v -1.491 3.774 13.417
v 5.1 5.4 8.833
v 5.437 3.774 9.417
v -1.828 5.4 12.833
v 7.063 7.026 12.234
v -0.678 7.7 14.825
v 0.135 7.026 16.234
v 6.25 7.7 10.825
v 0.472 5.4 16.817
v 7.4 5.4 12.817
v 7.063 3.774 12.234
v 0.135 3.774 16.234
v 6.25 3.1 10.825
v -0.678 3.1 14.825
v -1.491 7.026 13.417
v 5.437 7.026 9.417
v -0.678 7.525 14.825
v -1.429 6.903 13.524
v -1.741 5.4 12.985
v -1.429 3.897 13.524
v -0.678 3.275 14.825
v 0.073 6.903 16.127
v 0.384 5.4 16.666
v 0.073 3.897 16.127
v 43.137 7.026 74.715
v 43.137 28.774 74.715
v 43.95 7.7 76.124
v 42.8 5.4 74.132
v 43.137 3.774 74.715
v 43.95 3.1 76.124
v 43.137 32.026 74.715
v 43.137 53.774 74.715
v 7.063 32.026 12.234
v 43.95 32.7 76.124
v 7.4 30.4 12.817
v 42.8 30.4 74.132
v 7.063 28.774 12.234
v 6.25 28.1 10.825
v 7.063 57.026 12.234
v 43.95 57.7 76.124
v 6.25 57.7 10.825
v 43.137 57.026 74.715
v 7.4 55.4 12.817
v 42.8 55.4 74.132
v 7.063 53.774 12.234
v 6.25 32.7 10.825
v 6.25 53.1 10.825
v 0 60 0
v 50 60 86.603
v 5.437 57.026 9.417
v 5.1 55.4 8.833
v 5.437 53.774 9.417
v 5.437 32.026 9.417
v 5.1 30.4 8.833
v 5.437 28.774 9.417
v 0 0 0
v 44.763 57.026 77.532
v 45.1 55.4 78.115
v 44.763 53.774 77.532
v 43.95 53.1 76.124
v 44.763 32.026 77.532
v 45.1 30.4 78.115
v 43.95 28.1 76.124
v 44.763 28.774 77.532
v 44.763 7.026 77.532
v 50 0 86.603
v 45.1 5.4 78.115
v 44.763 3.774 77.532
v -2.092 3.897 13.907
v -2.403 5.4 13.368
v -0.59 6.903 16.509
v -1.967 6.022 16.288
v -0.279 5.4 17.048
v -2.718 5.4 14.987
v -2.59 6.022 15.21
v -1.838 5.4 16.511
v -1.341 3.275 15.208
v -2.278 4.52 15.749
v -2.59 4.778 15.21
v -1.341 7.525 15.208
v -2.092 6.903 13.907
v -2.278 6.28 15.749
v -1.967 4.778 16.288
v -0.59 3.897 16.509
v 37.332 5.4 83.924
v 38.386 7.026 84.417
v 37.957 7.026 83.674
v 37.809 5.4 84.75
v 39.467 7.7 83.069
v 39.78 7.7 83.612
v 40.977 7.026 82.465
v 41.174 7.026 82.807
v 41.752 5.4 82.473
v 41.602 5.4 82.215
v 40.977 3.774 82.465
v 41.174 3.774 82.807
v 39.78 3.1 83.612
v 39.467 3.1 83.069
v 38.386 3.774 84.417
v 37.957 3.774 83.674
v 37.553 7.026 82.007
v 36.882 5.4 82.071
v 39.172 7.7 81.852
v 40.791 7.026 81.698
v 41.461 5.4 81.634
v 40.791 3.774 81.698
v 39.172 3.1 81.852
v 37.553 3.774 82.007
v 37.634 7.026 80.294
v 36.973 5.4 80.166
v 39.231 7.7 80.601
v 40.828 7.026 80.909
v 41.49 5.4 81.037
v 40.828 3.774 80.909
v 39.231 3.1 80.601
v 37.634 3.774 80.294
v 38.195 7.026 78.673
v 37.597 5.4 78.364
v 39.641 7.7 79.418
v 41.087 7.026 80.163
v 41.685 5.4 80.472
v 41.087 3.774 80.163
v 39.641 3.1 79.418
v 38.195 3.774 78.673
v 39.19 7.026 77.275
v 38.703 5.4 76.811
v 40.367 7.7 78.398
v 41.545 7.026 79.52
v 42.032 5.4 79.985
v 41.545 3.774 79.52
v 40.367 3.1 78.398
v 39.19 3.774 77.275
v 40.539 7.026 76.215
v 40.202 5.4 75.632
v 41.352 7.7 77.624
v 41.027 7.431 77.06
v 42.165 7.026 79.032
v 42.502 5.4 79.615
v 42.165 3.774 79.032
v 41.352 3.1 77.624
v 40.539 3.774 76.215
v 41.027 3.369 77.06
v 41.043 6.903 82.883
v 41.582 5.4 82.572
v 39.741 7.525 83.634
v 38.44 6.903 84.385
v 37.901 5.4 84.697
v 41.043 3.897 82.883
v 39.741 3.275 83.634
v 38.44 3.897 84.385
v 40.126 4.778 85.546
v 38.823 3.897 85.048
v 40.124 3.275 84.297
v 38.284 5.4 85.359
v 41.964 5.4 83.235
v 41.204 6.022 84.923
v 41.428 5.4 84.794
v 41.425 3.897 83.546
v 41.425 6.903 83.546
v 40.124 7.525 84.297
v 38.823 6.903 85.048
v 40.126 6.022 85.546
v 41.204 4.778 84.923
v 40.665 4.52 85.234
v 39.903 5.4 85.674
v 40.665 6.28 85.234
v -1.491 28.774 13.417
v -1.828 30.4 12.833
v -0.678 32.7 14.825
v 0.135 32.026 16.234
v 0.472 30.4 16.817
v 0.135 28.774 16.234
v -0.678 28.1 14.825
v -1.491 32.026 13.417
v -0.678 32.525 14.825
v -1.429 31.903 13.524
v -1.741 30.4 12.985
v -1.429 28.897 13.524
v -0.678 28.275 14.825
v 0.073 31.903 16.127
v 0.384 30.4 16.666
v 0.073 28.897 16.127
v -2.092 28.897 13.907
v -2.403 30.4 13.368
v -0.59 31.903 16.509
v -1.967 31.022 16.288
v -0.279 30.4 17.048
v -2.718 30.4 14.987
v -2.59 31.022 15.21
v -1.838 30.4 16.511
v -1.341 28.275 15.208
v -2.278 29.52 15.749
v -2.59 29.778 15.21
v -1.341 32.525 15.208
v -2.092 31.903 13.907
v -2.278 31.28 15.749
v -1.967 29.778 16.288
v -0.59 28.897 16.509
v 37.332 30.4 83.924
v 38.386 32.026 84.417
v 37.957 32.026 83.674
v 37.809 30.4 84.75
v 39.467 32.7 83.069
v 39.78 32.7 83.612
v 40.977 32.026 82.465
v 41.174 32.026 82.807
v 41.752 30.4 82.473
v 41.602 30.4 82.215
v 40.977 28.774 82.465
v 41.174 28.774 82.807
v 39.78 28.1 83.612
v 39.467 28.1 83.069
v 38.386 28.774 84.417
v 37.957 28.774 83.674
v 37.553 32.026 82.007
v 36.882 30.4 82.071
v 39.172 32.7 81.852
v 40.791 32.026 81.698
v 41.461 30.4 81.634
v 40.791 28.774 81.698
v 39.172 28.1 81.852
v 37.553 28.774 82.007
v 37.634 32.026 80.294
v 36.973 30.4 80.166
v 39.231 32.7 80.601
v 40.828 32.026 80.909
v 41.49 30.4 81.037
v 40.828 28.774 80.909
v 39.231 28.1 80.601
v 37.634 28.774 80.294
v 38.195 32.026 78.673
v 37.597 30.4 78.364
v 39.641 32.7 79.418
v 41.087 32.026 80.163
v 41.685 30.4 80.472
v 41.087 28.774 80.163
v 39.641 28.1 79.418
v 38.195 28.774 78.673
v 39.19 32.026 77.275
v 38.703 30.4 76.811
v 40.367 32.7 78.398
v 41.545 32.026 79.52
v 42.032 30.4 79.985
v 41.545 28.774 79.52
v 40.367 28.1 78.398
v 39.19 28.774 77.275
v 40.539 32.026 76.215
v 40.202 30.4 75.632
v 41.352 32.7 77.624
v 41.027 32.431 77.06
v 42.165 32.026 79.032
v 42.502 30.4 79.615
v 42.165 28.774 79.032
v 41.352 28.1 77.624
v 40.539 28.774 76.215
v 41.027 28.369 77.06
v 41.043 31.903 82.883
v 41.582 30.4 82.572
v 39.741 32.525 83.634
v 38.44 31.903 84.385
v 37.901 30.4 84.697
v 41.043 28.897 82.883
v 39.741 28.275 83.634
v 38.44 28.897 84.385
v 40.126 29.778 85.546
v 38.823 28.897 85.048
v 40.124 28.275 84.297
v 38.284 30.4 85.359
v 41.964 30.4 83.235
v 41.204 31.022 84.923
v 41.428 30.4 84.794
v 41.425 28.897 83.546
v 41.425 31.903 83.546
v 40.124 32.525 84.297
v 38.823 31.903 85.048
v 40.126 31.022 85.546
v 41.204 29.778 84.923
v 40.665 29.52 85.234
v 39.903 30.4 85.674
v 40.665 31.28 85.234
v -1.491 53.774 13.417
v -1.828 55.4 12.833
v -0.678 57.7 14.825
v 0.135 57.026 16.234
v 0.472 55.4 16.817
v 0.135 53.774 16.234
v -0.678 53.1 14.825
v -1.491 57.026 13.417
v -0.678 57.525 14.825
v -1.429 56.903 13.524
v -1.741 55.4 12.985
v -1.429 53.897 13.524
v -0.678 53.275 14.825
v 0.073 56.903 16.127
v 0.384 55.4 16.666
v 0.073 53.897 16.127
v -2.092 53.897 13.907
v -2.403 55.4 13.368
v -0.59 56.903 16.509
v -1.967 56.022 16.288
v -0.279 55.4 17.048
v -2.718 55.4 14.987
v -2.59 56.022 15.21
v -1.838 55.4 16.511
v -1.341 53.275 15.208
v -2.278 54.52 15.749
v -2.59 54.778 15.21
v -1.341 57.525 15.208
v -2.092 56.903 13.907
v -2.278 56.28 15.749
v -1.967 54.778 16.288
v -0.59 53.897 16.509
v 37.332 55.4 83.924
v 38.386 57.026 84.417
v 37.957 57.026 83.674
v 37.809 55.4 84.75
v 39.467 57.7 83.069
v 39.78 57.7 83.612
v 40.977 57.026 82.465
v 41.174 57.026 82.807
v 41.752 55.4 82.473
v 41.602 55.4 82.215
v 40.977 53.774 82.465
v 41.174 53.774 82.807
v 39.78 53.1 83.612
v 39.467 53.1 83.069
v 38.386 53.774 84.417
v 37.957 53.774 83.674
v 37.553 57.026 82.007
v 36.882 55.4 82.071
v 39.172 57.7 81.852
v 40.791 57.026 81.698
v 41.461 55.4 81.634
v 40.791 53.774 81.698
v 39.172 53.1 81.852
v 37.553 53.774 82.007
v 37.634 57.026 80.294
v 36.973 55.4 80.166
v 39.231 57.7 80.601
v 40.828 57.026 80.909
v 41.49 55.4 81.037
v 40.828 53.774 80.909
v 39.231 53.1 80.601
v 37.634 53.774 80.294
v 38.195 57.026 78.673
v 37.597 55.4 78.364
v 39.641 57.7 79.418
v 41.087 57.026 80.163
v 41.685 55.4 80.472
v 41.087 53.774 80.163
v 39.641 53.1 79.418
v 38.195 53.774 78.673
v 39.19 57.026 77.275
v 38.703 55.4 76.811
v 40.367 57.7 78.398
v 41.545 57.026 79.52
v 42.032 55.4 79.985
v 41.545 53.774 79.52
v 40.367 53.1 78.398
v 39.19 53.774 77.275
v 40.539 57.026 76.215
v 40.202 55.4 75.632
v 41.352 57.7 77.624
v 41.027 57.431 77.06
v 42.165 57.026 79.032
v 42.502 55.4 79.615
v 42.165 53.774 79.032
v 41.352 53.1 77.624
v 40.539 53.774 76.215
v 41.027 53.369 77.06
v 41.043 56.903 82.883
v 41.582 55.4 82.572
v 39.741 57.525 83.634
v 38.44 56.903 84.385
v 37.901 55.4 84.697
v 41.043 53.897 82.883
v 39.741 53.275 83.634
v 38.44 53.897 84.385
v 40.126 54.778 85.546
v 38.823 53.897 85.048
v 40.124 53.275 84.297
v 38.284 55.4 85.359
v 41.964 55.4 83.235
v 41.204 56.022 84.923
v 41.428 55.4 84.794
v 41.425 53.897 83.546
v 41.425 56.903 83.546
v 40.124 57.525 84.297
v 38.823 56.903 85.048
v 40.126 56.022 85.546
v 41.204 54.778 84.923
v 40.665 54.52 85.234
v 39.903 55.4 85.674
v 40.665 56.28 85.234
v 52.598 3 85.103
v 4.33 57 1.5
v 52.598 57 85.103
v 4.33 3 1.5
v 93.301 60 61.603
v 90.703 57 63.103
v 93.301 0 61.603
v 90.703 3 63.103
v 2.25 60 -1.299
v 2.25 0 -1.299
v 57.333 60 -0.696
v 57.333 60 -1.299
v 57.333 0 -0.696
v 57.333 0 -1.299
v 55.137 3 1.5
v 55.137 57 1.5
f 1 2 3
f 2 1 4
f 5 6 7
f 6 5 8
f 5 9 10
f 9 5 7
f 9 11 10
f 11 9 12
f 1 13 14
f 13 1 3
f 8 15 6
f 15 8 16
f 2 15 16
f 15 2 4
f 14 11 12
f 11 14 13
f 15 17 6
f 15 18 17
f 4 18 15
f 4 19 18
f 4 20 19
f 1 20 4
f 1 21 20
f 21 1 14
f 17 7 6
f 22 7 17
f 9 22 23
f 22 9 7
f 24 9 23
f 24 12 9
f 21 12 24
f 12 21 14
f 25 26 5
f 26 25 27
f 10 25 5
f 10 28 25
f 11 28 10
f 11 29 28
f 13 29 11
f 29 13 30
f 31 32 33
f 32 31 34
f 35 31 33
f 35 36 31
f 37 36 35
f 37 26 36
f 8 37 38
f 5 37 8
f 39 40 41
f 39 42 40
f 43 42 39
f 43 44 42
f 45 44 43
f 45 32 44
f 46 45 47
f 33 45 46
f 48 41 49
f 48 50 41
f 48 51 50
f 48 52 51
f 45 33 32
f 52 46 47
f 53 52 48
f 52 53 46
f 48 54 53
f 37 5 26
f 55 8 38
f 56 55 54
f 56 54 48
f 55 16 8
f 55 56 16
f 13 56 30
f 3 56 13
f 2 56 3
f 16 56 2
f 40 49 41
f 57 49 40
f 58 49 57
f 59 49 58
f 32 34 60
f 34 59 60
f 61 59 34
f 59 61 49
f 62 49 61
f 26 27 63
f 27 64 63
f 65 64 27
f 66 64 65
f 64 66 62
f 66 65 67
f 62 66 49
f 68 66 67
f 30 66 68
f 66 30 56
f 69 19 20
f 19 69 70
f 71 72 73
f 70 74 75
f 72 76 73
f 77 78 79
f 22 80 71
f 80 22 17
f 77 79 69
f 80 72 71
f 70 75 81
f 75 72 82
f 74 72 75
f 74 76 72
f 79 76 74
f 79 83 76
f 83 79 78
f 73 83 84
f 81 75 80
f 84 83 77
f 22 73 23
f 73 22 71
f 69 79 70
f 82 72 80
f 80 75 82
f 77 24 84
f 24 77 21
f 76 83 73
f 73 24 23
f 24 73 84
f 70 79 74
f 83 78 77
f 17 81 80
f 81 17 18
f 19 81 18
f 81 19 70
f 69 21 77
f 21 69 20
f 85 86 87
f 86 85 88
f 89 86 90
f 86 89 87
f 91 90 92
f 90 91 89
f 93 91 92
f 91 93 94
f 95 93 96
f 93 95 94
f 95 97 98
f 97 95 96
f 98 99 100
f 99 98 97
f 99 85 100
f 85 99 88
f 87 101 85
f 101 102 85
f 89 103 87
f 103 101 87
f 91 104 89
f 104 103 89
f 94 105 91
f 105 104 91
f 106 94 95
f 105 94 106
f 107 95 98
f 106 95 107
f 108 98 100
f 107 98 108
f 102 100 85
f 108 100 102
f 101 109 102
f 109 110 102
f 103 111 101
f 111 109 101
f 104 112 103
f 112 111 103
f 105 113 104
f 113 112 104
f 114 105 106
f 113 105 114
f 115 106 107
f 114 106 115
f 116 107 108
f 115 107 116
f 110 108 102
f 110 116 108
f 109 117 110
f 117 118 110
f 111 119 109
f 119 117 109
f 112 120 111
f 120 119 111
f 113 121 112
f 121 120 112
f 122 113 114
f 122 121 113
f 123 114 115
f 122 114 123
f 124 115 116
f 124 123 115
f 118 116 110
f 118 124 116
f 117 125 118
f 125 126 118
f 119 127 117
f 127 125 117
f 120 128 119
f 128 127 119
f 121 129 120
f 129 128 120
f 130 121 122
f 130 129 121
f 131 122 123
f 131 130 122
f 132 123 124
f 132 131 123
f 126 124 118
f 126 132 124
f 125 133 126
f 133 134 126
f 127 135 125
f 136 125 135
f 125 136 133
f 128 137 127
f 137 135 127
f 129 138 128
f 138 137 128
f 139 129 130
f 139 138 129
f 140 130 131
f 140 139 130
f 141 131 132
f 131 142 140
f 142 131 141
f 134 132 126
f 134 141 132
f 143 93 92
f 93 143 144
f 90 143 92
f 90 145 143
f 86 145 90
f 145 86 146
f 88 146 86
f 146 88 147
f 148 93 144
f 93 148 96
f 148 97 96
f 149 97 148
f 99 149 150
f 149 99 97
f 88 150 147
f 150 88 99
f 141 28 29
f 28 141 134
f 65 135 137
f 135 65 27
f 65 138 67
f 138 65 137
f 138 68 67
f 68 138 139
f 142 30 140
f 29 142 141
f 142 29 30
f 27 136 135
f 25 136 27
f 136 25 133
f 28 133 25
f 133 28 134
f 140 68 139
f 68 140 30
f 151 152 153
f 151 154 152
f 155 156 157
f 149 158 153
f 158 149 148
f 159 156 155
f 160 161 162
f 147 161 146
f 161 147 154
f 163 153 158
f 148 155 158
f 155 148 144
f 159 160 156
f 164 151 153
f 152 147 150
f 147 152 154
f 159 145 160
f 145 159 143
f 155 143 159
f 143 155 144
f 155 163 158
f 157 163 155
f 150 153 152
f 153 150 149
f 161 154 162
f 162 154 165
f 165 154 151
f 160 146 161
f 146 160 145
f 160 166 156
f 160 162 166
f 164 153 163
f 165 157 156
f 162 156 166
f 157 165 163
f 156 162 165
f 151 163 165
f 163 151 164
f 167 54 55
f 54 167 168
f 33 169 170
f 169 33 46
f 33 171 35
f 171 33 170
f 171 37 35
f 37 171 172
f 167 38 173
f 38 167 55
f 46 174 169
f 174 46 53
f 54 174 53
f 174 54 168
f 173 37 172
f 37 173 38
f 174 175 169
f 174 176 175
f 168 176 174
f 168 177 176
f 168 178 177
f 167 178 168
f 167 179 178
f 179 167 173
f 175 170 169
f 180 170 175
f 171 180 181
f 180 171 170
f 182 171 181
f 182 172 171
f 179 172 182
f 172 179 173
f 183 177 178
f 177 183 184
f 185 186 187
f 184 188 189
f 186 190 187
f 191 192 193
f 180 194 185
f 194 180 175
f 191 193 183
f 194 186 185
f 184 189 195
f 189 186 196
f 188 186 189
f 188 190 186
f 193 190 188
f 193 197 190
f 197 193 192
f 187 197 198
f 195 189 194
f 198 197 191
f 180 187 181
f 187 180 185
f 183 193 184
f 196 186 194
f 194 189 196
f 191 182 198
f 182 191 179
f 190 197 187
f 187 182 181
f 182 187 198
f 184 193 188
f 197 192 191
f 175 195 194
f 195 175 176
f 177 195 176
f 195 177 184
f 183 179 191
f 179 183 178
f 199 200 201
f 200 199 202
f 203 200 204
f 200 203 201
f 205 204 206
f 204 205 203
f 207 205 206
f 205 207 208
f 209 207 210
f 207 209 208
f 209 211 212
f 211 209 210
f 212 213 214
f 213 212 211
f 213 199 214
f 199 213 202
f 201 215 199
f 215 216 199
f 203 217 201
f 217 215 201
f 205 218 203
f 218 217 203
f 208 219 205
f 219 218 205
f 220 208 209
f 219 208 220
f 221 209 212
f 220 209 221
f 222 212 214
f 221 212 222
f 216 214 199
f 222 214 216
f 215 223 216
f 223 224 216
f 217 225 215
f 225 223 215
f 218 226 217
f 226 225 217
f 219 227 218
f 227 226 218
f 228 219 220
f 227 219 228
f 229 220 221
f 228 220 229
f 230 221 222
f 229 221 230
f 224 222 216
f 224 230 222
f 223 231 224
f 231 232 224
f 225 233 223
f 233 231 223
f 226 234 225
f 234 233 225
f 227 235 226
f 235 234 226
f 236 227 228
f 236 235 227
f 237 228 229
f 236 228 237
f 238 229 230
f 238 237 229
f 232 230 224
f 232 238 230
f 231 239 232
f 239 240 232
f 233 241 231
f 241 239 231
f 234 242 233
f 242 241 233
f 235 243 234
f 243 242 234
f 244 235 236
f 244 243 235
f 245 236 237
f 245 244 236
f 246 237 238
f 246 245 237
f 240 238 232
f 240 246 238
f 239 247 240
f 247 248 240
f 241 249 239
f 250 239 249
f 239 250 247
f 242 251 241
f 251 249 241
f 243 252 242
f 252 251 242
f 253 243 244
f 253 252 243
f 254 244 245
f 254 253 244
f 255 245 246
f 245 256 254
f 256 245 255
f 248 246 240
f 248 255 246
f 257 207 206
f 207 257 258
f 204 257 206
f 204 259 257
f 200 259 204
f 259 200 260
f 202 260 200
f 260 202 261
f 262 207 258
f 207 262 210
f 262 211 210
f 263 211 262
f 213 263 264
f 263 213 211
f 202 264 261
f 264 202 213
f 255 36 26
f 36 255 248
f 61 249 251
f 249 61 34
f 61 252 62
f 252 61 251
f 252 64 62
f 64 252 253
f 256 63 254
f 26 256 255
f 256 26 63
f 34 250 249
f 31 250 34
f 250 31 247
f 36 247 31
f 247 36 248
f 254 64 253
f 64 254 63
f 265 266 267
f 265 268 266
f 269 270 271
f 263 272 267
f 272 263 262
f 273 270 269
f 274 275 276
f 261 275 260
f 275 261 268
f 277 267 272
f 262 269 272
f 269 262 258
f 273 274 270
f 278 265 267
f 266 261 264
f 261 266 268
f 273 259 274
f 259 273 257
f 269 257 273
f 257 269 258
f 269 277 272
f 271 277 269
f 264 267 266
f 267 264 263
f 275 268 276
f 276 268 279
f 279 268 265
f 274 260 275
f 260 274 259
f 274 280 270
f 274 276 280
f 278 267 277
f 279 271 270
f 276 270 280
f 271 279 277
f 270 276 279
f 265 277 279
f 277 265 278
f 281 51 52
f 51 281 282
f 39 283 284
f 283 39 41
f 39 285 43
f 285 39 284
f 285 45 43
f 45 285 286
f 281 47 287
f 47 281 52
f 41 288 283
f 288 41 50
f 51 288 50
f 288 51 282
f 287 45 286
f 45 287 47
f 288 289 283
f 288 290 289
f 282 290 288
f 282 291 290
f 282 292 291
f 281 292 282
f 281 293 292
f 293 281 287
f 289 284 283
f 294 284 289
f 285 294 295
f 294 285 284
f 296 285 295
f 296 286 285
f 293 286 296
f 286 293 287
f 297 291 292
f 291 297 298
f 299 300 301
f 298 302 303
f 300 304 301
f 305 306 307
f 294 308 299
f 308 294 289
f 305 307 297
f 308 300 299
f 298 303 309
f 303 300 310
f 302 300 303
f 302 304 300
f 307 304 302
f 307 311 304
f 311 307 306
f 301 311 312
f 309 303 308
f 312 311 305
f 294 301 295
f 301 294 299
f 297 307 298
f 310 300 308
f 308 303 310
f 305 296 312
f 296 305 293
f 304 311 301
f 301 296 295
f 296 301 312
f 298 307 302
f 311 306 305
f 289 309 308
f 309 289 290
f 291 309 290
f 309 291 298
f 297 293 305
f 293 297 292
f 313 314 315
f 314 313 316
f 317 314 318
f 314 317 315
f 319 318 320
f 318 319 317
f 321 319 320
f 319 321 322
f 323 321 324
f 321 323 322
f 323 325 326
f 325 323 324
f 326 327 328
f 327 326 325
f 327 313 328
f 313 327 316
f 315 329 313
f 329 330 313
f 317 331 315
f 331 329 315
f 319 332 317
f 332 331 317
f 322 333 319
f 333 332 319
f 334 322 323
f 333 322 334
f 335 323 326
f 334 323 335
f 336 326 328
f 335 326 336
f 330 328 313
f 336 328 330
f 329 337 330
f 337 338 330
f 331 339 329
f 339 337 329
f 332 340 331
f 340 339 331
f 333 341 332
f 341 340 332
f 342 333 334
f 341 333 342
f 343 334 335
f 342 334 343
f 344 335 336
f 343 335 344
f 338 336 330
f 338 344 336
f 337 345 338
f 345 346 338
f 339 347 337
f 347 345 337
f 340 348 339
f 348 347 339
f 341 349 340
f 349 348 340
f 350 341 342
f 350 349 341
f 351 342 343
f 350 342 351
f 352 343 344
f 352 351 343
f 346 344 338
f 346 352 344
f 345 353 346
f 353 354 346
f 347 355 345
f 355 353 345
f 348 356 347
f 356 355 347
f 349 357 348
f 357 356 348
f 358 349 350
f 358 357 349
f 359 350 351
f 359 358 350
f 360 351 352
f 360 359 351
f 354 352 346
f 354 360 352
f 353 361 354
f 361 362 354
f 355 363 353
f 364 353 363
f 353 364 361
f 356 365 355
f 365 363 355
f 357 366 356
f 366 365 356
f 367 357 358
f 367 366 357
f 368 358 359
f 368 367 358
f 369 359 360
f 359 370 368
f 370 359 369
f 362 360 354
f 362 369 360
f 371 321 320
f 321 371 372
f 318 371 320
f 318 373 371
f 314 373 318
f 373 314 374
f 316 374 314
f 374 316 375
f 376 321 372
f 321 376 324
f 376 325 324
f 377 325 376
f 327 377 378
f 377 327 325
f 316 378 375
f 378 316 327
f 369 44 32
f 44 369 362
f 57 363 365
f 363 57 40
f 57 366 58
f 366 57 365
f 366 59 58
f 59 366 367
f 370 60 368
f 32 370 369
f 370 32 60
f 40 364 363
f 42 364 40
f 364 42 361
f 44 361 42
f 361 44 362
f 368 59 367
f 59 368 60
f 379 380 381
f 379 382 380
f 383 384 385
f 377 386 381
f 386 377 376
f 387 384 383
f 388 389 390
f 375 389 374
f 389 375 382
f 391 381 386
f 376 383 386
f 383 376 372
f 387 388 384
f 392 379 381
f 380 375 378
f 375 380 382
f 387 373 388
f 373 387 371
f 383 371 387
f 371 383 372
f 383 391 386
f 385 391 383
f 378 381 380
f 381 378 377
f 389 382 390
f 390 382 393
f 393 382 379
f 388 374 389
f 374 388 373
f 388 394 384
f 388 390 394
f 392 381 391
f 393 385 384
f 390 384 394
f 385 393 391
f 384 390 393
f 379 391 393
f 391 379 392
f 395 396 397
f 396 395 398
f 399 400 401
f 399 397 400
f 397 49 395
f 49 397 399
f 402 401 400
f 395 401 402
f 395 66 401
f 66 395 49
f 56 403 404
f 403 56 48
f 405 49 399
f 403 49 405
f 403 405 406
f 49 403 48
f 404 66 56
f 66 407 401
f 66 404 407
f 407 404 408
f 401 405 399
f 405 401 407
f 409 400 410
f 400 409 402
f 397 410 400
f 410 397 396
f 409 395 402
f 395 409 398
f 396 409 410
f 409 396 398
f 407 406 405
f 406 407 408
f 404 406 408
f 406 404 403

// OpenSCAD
// file: pegboard.scad
/* pin dimentions */
pin_diameter = 5;
pin_spacing = 25;
pin_length = 10;
pin_tip_height = 2;
pin_clearance = 0.4;

/* pegboard width */
pegboard_width = 3;
pegboard_clearance = 0.6;

/* base width */
base_width = 3;

/* angle */
angle = 30;

/* DON'T TOUCH BELOW HERE! Internal values! */
epsilon = 0.1;
pin_diameter_ = pin_diameter - pin_clearance;


module torus(r1, r2, angle=360) {
    rotate_extrude(angle=angle) translate([r2, 0, 0]) circle(r=r1);
}

module pin() {
    union() {
        cylinder(h=pin_length - pin_tip_height, r=pin_diameter_/2);
        translate([0, 0, pin_length - pin_tip_height])
            scale([1, 1, (pin_tip_height * 2 / pin_diameter_)])
                sphere(d=pin_diameter_);
    }
}

module curvy_pin() {
    _pegboard_width = pegboard_width + pegboard_clearance;

    torus_outer_radius = pin_length - _pegboard_width;
    torus_r1 = pin_diameter_/2;
    torus_r2 = torus_outer_radius - torus_r1;

    union() {
        translate([0, 0, 0])
            cylinder(h=_pegboard_width, r=pin_diameter_/2);

        translate([torus_outer_radius/2 - torus_r1,
                   0,
                   torus_outer_radius/2 + _pegboard_width])
            rotate([90, 0, 0])
                translate([torus_outer_radius/2, -torus_outer_radius/2, 0])
                    rotate([0, 0, 90])
                        torus(r1=torus_r1, r2=torus_r2, angle=90);

        translate([torus_outer_radius-torus_r1 + 0*_pegboard_width/2, 0, pin_length - pin_diameter_/2])
            scale([(pin_tip_height*2/pin_diameter_), 1, 1])
                sphere(d=pin_diameter_);
    }
}

module pin_pair(spacing=pin_spacing + pin_clearance) {
    translate([0, pin_diameter_/2, pin_diameter_/2])
        rotate([0, -90, 0])
            union() {
                pin();
                translate([spacing, 0, 0]) curvy_pin();
        }
}

module fill_with_pin_pairs(width, height) {
    spacing_between = pin_spacing - pin_diameter_;

    pin_count_horizontal = floor((width + spacing_between) / (pin_diameter_ + spacing_between));
    padding_horizontal = (width - (pin_count_horizontal * pin_diameter_ + (pin_count_horizontal - 1) * spacing_between)) / 2;

    pin_count_vertical = floor((height + spacing_between) / (pin_diameter_ + spacing_between));
    spacing_vertical = (pin_count_vertical - 1) * pin_spacing;
    padding_vertical = (height - spacing_vertical - pin_diameter_) / 2;

    translate([0, padding_horizontal, padding_vertical]) {
        for (i = [1:pin_count_horizontal]) {
            translate([0, (i-1) * pin_spacing + pin_clearance, 0])
                pin_pair(spacing_vertical + pin_clearance);
        }
    }
}

module base(width, height) {
    union(){
        cube([base_width, width, height]);
        fill_with_pin_pairs(width, height);
    }
}
// main file
include <pegboard.scad>

bin_height = 100;
bin_width = 60;
bin_depth = 50;
bin_thickness = 3;

module bin(
    dimensions=[bin_depth, bin_width, bin_height],
    thickness=bin_thickness
) {
    outer_cube = dimensions;
    inner_cube = dimensions - 2 * [thickness, thickness, -epsilon];
    bottom_cube = [dimensions.x / cos(angle) - 2 * thickness * sin(angle), dimensions.y, thickness];
    angle_cube = [dimensions.z * 2, dimensions.y + 2 * epsilon, dimensions.z];

    difference() {
        union() {
            base(dimensions.y, dimensions.z);
            difference() {
                cube(outer_cube);
                translate([thickness, thickness, -epsilon])
                    cube(inner_cube);
            }

            translate([2*thickness * sin(angle), 0 ,0])
                rotate([0, -angle, 0])
                    cube(bottom_cube);
        }

        translate([0, -epsilon, -thickness * sin(angle)])
            rotate([0, 1 * (90 - angle), 0])
                cube(angle_cube);
    }
}

rotate([0, angle, 0]) bin();
